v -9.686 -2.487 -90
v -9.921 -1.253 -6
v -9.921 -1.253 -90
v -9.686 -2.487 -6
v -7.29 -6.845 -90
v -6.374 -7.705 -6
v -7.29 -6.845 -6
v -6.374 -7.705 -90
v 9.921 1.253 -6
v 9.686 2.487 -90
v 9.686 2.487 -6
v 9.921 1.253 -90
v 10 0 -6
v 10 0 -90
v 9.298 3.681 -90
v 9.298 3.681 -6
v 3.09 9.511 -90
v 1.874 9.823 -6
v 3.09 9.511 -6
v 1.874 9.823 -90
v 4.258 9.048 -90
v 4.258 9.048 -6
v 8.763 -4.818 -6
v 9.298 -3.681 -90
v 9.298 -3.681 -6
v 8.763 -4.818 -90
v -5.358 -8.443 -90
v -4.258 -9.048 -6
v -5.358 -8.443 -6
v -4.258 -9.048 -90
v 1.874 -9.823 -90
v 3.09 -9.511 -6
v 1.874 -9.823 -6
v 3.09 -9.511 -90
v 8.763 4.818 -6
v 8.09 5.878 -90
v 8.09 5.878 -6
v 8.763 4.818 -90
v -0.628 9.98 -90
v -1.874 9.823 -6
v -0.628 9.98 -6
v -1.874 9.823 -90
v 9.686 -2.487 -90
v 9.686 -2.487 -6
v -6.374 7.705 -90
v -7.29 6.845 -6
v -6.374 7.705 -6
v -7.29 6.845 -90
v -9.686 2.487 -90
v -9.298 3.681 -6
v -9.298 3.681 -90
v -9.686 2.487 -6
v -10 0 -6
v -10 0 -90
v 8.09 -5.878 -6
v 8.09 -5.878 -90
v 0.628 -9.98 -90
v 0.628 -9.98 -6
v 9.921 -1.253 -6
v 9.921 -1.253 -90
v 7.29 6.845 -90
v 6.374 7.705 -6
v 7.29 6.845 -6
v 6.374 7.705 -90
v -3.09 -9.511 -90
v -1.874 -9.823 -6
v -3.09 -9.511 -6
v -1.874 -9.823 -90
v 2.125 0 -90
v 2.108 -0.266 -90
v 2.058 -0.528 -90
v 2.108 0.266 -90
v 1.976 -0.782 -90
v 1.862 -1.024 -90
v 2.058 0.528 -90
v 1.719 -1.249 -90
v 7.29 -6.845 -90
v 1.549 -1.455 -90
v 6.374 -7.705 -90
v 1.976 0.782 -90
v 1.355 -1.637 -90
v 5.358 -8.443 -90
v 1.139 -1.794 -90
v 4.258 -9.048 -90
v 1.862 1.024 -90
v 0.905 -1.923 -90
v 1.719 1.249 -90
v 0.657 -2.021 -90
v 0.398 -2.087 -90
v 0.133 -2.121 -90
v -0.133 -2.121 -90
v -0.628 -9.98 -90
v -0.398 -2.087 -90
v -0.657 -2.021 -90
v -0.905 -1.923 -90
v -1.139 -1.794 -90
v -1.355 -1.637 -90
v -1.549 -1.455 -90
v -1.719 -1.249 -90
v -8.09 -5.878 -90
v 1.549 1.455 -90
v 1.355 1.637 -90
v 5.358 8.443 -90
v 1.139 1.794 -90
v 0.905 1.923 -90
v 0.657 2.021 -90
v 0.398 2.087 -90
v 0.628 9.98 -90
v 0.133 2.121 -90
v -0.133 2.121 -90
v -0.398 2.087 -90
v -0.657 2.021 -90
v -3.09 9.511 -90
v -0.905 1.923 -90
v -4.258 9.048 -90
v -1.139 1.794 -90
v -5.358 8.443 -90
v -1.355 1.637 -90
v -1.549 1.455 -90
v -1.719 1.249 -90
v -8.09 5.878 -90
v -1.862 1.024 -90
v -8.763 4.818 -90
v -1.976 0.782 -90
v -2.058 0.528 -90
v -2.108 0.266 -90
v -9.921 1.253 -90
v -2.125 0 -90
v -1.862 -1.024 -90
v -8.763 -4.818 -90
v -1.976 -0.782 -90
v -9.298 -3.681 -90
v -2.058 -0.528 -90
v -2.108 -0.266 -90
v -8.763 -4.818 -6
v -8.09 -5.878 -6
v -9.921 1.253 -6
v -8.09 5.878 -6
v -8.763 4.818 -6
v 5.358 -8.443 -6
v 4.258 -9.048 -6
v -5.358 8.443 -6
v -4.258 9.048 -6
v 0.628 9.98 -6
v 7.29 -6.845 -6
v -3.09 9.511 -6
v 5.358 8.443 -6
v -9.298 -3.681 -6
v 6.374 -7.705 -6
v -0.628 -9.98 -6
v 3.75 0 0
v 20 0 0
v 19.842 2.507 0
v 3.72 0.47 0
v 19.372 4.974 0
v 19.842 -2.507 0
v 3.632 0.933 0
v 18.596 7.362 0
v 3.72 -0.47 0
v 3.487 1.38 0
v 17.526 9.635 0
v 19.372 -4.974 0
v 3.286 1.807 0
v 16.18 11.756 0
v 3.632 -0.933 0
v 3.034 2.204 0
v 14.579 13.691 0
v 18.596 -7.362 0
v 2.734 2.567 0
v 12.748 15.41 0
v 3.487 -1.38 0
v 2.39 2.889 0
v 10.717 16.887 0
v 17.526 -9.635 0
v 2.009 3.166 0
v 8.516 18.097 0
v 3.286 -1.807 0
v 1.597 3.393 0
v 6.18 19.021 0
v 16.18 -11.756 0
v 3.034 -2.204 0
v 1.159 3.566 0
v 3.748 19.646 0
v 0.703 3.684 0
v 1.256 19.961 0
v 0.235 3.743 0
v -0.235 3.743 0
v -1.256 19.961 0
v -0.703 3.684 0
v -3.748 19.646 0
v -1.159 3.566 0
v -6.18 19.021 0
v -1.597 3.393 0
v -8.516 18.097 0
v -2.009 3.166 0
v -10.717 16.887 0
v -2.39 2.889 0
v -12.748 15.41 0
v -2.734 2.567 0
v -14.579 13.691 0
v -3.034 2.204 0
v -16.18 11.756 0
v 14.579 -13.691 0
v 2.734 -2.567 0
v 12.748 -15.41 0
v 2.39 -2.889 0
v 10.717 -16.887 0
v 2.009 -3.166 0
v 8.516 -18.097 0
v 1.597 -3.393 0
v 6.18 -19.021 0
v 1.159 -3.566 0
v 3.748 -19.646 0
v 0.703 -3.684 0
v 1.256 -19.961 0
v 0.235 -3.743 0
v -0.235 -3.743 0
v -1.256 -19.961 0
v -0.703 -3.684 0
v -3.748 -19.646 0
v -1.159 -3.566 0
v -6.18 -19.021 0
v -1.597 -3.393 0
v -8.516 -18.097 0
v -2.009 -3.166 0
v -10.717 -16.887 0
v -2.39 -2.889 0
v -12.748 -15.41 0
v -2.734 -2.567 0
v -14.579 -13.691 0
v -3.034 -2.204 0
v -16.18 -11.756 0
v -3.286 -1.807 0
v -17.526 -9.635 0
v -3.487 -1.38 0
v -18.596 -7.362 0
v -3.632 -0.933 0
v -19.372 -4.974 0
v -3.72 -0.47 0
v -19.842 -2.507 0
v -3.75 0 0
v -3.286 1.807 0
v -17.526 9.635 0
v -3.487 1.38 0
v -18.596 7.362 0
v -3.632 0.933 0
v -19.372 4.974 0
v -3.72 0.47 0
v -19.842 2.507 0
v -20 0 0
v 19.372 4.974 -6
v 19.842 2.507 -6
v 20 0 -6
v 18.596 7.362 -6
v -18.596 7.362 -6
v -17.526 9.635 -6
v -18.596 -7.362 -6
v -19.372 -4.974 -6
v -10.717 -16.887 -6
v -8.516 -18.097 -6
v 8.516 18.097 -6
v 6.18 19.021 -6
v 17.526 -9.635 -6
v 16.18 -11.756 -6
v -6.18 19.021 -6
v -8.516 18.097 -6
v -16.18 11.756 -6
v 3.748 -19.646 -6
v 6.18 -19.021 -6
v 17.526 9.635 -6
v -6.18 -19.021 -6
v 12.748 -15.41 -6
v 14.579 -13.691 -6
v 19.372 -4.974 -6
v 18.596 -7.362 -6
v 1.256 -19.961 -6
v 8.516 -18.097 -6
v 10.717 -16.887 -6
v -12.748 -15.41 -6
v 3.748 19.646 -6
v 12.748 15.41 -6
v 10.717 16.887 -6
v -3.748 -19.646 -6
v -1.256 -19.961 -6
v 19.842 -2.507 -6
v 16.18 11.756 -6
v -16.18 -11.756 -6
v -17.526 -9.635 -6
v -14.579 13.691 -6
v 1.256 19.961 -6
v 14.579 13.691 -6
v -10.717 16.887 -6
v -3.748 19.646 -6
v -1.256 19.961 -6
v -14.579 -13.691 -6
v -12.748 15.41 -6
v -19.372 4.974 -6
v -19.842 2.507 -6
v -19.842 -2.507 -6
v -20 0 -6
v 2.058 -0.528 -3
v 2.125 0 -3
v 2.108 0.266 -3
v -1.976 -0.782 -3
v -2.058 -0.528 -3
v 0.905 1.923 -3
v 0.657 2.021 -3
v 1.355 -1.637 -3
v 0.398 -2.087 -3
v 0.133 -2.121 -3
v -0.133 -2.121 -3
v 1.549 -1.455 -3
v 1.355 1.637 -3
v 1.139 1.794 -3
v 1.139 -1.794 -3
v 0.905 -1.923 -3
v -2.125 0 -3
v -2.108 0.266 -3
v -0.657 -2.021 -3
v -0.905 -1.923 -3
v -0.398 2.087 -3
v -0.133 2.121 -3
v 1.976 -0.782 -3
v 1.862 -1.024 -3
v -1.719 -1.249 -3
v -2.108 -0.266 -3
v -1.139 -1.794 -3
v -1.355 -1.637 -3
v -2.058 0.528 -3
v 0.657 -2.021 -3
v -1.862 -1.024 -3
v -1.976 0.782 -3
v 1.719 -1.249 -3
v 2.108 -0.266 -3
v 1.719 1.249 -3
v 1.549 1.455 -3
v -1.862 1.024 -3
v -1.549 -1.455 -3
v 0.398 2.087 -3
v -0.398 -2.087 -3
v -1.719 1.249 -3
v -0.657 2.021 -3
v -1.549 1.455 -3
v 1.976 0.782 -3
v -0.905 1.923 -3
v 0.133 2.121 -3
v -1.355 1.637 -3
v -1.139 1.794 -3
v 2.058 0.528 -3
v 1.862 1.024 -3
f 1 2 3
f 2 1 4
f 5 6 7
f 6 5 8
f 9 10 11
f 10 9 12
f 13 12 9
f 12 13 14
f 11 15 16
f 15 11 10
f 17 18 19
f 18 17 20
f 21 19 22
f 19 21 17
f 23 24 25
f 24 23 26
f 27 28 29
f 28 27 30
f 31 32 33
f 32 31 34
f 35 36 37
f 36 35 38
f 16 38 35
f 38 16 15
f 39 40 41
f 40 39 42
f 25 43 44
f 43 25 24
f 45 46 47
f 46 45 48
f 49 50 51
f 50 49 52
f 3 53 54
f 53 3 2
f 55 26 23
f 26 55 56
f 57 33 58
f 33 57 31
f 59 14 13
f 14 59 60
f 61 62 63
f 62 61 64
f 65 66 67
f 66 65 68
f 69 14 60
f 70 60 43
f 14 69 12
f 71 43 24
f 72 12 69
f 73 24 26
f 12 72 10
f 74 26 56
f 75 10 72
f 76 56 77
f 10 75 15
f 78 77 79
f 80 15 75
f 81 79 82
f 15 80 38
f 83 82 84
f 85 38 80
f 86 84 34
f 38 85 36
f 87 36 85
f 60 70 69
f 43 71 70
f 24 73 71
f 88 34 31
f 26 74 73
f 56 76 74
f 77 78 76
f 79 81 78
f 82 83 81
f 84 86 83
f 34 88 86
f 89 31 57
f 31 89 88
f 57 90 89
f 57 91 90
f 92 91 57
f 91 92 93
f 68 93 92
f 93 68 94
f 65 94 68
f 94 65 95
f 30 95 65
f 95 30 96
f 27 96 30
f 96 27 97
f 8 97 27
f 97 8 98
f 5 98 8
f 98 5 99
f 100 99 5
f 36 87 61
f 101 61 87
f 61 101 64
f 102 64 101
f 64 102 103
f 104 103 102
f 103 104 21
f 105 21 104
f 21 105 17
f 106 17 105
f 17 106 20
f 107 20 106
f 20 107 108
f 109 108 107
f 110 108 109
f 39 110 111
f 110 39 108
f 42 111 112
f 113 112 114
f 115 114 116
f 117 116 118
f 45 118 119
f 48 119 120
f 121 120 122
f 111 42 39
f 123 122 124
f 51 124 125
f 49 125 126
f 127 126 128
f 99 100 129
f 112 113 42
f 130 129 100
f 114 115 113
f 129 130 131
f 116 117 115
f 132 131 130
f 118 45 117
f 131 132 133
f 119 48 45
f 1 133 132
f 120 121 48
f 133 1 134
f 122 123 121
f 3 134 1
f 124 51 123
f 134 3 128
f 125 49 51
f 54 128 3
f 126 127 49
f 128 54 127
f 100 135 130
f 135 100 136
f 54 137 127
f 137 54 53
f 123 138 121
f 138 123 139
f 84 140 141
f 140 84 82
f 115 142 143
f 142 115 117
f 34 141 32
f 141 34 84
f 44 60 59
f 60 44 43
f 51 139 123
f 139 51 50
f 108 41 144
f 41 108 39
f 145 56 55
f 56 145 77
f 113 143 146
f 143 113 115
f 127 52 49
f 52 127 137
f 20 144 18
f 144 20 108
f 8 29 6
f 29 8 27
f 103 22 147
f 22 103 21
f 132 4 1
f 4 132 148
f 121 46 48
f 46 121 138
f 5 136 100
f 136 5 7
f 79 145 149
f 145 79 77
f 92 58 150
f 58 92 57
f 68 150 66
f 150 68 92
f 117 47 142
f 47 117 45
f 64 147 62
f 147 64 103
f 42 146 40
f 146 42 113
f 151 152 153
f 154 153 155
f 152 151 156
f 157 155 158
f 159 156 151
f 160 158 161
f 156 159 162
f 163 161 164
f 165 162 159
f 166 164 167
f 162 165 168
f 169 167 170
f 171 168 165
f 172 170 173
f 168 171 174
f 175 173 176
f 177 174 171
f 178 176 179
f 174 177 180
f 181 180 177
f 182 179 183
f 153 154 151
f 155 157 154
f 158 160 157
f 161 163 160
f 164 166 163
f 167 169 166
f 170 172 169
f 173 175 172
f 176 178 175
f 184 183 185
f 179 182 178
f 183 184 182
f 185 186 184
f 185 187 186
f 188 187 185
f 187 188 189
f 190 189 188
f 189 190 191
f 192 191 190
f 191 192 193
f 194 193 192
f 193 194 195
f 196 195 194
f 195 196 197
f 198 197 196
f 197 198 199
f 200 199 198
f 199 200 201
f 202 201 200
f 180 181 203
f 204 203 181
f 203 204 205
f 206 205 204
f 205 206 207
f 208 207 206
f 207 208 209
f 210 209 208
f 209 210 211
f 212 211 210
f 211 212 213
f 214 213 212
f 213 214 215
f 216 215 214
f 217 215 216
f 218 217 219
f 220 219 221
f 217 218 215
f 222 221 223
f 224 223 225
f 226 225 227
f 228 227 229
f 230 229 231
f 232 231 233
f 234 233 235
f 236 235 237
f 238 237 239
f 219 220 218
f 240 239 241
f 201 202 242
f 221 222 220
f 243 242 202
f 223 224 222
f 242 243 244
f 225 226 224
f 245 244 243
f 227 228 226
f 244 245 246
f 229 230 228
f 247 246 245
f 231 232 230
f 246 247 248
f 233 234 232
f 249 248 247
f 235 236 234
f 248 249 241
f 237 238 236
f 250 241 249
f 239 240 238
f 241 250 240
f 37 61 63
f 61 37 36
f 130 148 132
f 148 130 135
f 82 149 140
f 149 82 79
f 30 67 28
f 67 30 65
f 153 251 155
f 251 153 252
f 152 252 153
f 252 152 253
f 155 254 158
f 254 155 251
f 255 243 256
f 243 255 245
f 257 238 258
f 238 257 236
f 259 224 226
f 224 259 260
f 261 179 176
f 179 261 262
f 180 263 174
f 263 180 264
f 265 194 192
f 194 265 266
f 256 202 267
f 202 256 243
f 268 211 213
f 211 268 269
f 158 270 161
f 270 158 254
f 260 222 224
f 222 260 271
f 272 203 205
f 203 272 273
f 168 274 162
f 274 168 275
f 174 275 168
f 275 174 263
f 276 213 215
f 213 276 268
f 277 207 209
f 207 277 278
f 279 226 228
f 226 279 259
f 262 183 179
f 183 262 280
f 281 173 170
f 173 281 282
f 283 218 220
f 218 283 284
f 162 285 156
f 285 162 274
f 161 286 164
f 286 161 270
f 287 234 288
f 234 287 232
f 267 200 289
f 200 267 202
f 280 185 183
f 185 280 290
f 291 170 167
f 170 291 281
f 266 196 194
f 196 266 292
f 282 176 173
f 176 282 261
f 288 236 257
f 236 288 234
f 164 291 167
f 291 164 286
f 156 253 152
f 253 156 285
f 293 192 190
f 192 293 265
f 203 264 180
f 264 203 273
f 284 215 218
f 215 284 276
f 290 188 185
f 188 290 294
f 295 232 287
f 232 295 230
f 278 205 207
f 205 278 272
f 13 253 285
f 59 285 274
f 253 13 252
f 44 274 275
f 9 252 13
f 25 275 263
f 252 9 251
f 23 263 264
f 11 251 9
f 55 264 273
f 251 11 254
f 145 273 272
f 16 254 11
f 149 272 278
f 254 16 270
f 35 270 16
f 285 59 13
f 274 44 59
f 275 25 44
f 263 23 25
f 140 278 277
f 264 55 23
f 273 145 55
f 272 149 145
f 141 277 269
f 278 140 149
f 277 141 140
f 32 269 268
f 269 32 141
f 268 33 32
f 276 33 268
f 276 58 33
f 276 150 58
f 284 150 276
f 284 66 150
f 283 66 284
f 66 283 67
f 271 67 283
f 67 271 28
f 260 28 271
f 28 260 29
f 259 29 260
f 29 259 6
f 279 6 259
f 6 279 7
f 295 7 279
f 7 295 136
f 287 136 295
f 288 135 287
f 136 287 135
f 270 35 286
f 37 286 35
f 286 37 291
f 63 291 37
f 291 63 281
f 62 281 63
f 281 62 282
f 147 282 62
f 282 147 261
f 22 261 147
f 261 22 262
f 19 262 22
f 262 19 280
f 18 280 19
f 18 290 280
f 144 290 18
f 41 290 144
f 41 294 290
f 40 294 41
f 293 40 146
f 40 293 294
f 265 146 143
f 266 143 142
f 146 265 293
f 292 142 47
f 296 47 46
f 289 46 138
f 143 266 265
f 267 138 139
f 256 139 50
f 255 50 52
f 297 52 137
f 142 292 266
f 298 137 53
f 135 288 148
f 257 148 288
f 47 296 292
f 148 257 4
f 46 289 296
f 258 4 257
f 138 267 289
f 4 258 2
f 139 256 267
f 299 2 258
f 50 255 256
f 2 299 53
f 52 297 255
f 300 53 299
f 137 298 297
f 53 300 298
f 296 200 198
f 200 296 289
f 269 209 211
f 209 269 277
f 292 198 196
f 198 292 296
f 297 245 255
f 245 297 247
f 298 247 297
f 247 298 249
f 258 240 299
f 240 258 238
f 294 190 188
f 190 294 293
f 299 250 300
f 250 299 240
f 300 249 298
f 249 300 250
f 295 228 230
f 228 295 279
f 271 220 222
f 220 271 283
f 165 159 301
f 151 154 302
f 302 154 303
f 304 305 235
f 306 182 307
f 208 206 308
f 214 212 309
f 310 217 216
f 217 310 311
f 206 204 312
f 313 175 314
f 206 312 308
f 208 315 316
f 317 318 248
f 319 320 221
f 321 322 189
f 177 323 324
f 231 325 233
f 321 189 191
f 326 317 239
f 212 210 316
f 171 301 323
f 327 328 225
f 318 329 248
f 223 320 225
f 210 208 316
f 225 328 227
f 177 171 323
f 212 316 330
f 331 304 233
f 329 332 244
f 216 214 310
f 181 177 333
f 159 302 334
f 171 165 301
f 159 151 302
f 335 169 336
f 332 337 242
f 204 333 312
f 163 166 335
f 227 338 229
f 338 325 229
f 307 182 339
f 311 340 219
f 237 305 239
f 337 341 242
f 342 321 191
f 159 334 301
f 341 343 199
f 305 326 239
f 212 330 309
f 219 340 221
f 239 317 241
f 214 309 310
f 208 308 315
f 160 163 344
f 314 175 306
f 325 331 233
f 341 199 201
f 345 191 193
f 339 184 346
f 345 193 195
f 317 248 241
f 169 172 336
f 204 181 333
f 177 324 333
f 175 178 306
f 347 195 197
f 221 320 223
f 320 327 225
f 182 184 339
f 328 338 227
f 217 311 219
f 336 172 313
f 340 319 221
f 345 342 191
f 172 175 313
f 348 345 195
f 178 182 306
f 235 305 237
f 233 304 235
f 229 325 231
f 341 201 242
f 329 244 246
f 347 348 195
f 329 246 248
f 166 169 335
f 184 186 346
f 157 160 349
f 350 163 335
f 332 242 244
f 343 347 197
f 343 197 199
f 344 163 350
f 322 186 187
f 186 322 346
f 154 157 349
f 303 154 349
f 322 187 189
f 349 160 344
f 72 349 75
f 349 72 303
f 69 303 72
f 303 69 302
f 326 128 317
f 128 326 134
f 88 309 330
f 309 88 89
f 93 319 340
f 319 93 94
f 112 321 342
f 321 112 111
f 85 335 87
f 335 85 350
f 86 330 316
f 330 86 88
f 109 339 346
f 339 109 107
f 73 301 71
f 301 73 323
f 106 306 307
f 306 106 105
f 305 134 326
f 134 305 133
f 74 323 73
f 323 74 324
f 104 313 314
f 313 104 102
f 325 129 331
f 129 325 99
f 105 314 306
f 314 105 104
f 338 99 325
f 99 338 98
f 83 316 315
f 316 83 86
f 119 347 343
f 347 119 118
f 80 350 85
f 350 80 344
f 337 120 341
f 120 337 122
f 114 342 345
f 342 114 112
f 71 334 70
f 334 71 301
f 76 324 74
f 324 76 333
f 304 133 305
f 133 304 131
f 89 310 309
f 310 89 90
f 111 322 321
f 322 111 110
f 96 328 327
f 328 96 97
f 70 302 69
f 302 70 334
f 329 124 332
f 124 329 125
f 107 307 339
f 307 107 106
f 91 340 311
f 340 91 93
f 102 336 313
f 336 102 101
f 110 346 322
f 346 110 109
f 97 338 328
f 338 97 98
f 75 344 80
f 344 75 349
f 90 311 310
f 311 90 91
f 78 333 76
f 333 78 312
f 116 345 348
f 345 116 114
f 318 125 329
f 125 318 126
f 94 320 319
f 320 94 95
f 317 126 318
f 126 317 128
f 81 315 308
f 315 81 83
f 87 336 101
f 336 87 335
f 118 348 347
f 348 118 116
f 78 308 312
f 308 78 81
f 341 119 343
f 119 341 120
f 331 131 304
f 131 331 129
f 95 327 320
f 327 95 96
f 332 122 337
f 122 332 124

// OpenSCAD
$fn = 50;


difference() {
	union() {
		translate(v = [0, 0, -90.0000000000]) {
			cylinder(h = 90, r = 10.0000000000);
		}
		translate(v = [0, 0, -6.0000000000]) {
			cylinder(h = 6, r = 20.0000000000);
		}
	}
	union() {
		translate(v = [0, 0, 0]) {
			rotate(a = [0, 0, 0]) {
				difference() {
					union() {
						#translate(v = [0, 0, -90.0000000000]) {
							cylinder(h = 90, r = 2.0000000000);
						}
						#translate(v = [0, 0, -3]) {
							cylinder(h = 3, r = 10.0000000000, r1 = 2.1250000000, r2 = 3.7500000000);
						}
						#translate(v = [0, 0, -90.0000000000]) {
							cylinder(h = 90, r = 2.1250000000);
						}
						#translate(v = [0, 0, -90.0000000000]) {
							cylinder(h = 90, r = 2.0000000000);
						}
					}
					union();
				}
			}
		}
	}
}
